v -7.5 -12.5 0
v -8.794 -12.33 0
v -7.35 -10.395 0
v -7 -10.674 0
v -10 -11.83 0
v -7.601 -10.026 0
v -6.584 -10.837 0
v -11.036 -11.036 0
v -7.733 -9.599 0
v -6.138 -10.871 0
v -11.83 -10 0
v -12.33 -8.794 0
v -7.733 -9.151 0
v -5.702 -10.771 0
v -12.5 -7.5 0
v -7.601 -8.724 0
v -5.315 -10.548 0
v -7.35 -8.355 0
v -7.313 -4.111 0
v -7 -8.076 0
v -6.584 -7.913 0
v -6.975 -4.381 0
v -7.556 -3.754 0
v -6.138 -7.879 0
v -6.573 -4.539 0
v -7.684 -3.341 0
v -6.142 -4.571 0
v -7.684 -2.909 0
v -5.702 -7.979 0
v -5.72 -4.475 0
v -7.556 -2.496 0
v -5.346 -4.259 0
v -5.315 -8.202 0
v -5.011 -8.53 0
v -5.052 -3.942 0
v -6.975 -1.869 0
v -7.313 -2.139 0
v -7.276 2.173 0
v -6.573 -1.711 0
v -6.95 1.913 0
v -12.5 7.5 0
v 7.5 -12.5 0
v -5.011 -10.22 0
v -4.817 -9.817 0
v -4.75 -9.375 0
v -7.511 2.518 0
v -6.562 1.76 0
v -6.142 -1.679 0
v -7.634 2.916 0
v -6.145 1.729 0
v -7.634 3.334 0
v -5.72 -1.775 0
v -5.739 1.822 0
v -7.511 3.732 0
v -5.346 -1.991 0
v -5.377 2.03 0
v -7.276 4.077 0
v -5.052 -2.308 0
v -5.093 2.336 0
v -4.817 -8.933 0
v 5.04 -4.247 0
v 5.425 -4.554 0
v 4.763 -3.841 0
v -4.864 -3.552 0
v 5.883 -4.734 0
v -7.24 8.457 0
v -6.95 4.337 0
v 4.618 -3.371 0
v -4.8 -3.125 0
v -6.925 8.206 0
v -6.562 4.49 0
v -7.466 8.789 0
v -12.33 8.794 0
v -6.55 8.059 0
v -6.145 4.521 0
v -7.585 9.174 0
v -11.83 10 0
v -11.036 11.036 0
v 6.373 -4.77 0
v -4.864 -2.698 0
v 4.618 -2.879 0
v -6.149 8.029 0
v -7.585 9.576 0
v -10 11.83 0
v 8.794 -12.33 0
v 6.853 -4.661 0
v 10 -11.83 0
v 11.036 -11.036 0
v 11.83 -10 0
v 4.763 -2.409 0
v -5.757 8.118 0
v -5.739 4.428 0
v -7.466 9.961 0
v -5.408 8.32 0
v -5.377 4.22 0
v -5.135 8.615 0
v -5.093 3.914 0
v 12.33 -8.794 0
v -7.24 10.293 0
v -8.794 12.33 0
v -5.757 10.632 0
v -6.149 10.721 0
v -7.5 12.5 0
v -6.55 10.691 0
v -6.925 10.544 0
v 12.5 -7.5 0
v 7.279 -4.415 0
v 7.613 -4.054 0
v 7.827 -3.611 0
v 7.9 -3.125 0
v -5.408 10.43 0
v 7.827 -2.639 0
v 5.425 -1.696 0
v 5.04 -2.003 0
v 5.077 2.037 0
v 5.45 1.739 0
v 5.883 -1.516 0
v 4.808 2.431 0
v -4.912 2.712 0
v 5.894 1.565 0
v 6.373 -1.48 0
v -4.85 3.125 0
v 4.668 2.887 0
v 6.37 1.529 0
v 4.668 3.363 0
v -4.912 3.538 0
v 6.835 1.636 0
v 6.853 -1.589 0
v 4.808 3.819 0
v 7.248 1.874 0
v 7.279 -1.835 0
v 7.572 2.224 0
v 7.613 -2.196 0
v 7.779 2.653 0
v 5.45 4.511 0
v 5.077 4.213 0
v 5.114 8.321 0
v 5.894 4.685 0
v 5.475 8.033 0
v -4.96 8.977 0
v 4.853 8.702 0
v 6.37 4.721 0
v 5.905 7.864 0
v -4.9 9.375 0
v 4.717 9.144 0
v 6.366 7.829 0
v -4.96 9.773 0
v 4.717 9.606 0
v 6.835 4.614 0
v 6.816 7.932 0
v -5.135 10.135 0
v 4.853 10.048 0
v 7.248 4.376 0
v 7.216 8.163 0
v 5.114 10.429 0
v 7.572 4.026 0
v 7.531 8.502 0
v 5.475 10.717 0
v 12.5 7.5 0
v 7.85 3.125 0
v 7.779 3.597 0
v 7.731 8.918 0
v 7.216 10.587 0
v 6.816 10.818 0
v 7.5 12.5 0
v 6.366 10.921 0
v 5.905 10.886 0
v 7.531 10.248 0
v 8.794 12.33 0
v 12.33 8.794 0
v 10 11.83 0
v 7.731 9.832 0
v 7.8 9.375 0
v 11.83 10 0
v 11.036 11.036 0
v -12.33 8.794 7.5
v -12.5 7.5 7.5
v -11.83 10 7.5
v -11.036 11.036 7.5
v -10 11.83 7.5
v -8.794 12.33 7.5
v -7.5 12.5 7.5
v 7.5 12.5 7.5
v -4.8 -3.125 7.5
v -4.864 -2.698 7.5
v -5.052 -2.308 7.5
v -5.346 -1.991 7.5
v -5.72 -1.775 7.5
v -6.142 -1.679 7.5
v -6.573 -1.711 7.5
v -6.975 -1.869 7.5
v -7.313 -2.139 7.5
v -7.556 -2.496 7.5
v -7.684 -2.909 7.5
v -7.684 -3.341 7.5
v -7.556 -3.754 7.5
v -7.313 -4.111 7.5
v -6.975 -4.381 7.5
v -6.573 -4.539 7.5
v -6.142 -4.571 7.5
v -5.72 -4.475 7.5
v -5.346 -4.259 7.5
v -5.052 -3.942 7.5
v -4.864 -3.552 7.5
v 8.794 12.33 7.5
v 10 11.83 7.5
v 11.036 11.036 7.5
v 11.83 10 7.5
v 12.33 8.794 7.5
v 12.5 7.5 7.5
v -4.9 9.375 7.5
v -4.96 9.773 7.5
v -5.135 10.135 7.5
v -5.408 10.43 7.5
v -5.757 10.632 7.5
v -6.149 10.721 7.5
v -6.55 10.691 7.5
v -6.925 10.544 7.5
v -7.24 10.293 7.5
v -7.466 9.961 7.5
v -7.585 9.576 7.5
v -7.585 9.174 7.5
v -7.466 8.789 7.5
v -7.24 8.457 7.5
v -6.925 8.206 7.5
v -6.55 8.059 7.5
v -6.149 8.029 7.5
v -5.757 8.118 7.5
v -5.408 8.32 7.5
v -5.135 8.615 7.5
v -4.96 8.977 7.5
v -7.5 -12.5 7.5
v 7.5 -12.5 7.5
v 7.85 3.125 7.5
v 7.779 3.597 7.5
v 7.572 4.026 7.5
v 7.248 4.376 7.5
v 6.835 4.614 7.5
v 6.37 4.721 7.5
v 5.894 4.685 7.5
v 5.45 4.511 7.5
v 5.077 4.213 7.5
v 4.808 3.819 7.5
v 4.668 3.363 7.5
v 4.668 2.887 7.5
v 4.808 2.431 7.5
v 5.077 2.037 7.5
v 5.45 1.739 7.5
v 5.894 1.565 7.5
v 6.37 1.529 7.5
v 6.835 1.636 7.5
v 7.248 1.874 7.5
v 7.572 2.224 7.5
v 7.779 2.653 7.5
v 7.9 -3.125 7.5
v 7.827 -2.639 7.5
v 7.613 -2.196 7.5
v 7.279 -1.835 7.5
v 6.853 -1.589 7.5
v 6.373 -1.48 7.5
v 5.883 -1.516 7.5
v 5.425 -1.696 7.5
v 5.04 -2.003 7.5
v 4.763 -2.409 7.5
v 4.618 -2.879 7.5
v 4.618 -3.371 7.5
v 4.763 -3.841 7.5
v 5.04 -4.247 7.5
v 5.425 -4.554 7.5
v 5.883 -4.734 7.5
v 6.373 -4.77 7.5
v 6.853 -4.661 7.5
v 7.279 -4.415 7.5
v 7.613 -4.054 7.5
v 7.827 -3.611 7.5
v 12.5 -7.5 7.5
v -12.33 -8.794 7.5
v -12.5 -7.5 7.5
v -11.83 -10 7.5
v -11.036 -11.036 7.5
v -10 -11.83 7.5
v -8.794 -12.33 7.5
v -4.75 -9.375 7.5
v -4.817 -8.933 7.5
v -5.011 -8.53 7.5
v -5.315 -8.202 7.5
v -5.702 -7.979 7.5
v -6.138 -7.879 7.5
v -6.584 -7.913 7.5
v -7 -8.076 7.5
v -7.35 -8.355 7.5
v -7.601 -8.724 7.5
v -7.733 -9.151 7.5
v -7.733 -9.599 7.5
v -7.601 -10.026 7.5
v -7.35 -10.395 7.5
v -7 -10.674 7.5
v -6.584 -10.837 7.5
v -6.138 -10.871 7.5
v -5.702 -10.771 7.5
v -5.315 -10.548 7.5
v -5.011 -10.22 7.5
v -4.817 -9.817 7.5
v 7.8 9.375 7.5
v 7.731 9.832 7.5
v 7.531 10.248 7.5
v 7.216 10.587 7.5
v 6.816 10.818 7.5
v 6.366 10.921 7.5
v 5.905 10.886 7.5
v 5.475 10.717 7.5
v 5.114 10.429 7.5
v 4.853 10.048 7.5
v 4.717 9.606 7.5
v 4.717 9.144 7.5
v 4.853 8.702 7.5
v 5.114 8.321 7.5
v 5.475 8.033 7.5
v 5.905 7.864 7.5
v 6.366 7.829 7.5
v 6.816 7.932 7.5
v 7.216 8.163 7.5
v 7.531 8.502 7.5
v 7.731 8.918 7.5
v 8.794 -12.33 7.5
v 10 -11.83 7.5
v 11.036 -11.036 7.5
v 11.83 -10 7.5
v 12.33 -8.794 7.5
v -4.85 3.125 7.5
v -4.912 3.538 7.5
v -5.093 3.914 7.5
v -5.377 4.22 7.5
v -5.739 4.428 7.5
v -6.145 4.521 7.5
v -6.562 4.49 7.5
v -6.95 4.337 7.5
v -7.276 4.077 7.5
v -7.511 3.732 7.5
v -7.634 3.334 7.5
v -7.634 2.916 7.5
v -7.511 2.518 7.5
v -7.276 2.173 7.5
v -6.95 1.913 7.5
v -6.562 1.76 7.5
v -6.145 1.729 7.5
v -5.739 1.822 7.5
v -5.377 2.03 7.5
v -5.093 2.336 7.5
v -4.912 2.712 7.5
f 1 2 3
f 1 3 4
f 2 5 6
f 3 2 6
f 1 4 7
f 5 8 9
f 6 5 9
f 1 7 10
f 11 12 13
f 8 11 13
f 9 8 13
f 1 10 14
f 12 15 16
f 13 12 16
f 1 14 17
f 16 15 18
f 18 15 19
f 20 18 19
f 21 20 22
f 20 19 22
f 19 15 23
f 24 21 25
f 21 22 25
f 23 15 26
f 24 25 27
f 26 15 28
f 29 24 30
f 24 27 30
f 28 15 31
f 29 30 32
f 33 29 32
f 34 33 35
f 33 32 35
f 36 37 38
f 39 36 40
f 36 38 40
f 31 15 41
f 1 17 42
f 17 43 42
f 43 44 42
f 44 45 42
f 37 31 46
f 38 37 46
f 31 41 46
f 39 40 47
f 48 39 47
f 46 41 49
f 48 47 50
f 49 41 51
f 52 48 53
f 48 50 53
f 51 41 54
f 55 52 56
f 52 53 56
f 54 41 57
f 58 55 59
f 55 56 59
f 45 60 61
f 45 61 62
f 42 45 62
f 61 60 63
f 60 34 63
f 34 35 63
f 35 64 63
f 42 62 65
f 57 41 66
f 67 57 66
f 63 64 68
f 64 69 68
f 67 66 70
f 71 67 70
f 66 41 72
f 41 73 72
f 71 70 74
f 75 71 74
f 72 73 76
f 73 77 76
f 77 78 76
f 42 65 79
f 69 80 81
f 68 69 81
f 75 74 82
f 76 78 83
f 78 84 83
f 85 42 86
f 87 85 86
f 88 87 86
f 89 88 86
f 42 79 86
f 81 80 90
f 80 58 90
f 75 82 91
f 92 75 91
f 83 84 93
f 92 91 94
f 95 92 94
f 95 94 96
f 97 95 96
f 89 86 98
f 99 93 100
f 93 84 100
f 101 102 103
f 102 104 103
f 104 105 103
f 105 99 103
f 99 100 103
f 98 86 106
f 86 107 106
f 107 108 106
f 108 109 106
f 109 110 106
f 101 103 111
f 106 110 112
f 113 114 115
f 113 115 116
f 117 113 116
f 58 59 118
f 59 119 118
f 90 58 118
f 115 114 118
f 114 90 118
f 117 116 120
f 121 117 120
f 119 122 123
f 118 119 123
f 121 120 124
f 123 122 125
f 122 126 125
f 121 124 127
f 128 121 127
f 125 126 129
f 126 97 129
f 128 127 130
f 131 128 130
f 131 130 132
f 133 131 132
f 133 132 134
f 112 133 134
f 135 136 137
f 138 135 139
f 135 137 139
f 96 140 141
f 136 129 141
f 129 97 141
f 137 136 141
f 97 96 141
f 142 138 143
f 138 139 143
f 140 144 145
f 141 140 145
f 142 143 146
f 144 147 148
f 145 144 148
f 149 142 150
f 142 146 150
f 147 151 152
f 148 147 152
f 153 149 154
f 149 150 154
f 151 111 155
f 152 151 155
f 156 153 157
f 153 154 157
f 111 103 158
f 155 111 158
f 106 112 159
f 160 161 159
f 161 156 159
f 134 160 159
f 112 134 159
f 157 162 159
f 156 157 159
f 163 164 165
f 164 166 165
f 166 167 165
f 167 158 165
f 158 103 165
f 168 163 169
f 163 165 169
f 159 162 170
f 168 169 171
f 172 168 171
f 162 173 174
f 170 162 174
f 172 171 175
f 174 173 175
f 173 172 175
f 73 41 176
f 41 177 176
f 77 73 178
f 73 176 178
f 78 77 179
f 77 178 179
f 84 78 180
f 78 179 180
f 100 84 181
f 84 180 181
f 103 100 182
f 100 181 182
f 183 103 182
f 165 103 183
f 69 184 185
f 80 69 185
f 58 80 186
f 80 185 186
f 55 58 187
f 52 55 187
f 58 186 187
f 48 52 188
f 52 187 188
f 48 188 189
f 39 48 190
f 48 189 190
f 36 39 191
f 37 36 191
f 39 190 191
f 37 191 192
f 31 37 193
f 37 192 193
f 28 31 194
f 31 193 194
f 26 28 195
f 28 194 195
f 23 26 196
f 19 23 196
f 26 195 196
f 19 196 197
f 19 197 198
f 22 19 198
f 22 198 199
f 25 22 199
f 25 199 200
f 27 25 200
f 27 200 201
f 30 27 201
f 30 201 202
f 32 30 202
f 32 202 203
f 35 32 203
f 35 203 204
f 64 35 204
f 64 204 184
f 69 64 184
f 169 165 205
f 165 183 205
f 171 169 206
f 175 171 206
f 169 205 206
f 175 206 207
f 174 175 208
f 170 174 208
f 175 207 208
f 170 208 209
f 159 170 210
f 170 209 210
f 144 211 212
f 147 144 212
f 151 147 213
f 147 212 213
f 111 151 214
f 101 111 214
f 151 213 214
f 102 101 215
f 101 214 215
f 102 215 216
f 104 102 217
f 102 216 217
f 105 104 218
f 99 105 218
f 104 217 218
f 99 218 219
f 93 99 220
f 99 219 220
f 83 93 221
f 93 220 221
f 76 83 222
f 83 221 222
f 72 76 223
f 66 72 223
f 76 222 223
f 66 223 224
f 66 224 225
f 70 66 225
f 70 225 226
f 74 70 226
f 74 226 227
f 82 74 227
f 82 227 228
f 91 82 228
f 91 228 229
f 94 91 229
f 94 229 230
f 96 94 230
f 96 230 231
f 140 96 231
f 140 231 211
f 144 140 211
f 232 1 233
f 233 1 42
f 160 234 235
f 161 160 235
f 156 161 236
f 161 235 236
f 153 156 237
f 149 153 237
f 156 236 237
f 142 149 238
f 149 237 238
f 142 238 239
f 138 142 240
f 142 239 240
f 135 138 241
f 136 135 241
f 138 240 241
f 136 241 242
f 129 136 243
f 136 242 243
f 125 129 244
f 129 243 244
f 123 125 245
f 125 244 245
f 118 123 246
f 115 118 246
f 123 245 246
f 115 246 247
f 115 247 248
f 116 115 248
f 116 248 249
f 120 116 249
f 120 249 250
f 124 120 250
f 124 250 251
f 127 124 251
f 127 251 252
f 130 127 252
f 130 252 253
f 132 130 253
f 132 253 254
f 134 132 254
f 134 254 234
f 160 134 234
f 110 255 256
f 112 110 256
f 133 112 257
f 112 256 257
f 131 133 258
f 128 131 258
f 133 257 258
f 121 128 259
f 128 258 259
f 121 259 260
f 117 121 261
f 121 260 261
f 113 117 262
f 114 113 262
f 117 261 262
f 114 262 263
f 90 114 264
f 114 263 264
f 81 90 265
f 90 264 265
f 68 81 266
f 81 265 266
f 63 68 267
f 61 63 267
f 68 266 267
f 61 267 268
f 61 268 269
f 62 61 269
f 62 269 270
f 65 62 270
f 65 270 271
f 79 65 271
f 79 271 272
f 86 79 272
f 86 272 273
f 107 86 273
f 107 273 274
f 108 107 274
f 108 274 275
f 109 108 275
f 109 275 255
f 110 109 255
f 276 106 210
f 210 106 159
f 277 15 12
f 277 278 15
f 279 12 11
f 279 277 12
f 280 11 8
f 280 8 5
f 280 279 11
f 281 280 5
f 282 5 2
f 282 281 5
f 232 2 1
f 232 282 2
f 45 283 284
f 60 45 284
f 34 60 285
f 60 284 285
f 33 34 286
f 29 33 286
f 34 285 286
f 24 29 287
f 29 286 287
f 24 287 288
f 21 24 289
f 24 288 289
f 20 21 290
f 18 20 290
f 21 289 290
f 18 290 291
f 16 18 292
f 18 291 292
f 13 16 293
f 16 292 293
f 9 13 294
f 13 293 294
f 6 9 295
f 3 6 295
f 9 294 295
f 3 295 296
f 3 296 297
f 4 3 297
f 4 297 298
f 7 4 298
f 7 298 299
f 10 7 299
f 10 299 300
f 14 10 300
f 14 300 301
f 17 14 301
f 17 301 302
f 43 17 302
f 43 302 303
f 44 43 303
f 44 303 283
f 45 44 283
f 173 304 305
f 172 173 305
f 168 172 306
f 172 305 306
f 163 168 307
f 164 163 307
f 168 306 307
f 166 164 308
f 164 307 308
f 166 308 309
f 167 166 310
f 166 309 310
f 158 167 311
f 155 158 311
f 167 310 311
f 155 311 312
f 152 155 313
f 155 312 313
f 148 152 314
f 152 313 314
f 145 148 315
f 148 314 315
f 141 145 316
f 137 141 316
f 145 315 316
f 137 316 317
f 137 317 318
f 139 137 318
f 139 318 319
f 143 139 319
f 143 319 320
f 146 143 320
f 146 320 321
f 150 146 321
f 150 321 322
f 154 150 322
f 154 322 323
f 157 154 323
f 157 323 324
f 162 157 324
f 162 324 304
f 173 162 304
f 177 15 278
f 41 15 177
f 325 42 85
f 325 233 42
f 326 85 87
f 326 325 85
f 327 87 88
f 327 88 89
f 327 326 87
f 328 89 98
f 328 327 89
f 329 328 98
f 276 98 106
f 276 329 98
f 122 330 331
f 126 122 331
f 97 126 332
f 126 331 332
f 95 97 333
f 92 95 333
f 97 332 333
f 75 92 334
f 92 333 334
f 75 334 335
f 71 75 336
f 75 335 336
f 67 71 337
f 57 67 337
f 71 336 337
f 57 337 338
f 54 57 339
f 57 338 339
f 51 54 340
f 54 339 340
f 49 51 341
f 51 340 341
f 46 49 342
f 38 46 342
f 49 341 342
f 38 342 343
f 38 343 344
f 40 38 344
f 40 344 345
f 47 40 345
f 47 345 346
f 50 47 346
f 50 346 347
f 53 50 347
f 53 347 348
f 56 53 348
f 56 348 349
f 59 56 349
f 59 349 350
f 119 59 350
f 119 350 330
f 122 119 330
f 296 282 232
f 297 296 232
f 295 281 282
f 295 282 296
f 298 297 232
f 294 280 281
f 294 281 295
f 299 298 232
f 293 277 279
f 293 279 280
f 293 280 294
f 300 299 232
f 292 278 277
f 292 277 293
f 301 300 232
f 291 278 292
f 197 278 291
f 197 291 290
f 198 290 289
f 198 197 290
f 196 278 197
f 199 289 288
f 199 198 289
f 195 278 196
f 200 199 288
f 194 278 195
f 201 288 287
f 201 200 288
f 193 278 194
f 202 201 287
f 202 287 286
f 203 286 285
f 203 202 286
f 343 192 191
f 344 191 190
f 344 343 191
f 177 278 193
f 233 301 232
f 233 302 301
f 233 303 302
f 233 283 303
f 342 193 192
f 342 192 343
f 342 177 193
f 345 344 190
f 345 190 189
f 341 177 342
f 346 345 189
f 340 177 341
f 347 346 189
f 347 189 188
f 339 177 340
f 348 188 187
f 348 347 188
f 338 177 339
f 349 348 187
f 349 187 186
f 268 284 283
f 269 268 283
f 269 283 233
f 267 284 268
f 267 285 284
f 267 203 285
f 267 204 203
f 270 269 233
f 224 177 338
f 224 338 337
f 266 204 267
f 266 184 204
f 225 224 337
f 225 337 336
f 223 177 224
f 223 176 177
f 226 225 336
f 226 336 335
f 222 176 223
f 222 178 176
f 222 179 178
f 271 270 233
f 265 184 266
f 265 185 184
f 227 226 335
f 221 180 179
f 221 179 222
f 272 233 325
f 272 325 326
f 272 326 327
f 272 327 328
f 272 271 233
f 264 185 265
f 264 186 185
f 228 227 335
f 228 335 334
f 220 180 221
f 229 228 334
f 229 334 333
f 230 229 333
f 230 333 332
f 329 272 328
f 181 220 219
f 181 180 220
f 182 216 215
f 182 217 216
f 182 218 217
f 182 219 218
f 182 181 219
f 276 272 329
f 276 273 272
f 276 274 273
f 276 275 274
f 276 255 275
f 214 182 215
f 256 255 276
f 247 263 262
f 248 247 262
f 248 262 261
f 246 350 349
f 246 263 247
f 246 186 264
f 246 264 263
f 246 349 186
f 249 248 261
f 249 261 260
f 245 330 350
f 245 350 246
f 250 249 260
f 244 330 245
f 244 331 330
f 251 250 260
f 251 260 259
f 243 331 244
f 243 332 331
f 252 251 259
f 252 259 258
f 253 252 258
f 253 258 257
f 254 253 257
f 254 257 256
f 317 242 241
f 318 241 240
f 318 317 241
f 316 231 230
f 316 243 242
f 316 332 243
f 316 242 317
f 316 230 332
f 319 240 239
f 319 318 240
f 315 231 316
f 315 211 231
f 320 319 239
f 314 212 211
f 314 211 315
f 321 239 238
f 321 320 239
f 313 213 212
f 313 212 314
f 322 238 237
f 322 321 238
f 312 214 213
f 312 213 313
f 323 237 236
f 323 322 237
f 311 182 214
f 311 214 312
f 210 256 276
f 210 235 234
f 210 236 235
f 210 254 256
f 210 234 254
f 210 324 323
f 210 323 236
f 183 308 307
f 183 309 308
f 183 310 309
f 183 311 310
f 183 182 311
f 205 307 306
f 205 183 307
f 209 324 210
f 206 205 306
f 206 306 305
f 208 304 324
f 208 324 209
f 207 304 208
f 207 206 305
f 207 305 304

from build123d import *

# Parameters (mm, degrees)
F0_W     = 25
F0_H     = 25
F1_DEPTH = 7.5
F2_R     = 1.35
F2_R_2   = 1.4
F2_R_3   = 1.45
F2_R_4   = 1.5
F2_R_5   = 1.55
F2_R_6   = 1.6
F2_R_7   = 1.65
F3_DEPTH = 7.501
F4_R     = 5


with BuildPart() as f1:
    # F0 (on Top) → F1 (new body)
    with BuildSketch(Plane.XY):
        Rectangle(F0_W, F0_H)
    extrude(amount=F1_DEPTH)

    # F2 (on face) → F3 (cut, through all)
    with BuildSketch(Plane.XY.offset(7.5)):
        with Locations((-6.25, 9.375)):
            Circle(F2_R)
        with Locations((-6.25, 3.125)):
            Circle(F2_R_2)
        with Locations((-6.25, -3.125)):
            Circle(F2_R_3)
        with Locations((-6.25, -9.375)):
            Circle(F2_R_4)
        with Locations((6.25, 9.375)):
            Circle(F2_R_5)
        with Locations((6.25, 3.125)):
            Circle(F2_R_6)
        with Locations((6.25, -3.125)):
            Circle(F2_R_7)
    extrude(amount=-F3_DEPTH, mode=Mode.SUBTRACT)

    # F4
    f4_edges = [f1.edges().sort_by_distance(p)[0] for p in [
        (-12.5, 12.5, 3.75),
        (-12.5, -12.5, 3.75),
        (12.5, -12.5, 3.75),
        (12.5, 12.5, 3.75),
    ]]
    fillet(f4_edges, radius=F4_R)


solid = f1.part
